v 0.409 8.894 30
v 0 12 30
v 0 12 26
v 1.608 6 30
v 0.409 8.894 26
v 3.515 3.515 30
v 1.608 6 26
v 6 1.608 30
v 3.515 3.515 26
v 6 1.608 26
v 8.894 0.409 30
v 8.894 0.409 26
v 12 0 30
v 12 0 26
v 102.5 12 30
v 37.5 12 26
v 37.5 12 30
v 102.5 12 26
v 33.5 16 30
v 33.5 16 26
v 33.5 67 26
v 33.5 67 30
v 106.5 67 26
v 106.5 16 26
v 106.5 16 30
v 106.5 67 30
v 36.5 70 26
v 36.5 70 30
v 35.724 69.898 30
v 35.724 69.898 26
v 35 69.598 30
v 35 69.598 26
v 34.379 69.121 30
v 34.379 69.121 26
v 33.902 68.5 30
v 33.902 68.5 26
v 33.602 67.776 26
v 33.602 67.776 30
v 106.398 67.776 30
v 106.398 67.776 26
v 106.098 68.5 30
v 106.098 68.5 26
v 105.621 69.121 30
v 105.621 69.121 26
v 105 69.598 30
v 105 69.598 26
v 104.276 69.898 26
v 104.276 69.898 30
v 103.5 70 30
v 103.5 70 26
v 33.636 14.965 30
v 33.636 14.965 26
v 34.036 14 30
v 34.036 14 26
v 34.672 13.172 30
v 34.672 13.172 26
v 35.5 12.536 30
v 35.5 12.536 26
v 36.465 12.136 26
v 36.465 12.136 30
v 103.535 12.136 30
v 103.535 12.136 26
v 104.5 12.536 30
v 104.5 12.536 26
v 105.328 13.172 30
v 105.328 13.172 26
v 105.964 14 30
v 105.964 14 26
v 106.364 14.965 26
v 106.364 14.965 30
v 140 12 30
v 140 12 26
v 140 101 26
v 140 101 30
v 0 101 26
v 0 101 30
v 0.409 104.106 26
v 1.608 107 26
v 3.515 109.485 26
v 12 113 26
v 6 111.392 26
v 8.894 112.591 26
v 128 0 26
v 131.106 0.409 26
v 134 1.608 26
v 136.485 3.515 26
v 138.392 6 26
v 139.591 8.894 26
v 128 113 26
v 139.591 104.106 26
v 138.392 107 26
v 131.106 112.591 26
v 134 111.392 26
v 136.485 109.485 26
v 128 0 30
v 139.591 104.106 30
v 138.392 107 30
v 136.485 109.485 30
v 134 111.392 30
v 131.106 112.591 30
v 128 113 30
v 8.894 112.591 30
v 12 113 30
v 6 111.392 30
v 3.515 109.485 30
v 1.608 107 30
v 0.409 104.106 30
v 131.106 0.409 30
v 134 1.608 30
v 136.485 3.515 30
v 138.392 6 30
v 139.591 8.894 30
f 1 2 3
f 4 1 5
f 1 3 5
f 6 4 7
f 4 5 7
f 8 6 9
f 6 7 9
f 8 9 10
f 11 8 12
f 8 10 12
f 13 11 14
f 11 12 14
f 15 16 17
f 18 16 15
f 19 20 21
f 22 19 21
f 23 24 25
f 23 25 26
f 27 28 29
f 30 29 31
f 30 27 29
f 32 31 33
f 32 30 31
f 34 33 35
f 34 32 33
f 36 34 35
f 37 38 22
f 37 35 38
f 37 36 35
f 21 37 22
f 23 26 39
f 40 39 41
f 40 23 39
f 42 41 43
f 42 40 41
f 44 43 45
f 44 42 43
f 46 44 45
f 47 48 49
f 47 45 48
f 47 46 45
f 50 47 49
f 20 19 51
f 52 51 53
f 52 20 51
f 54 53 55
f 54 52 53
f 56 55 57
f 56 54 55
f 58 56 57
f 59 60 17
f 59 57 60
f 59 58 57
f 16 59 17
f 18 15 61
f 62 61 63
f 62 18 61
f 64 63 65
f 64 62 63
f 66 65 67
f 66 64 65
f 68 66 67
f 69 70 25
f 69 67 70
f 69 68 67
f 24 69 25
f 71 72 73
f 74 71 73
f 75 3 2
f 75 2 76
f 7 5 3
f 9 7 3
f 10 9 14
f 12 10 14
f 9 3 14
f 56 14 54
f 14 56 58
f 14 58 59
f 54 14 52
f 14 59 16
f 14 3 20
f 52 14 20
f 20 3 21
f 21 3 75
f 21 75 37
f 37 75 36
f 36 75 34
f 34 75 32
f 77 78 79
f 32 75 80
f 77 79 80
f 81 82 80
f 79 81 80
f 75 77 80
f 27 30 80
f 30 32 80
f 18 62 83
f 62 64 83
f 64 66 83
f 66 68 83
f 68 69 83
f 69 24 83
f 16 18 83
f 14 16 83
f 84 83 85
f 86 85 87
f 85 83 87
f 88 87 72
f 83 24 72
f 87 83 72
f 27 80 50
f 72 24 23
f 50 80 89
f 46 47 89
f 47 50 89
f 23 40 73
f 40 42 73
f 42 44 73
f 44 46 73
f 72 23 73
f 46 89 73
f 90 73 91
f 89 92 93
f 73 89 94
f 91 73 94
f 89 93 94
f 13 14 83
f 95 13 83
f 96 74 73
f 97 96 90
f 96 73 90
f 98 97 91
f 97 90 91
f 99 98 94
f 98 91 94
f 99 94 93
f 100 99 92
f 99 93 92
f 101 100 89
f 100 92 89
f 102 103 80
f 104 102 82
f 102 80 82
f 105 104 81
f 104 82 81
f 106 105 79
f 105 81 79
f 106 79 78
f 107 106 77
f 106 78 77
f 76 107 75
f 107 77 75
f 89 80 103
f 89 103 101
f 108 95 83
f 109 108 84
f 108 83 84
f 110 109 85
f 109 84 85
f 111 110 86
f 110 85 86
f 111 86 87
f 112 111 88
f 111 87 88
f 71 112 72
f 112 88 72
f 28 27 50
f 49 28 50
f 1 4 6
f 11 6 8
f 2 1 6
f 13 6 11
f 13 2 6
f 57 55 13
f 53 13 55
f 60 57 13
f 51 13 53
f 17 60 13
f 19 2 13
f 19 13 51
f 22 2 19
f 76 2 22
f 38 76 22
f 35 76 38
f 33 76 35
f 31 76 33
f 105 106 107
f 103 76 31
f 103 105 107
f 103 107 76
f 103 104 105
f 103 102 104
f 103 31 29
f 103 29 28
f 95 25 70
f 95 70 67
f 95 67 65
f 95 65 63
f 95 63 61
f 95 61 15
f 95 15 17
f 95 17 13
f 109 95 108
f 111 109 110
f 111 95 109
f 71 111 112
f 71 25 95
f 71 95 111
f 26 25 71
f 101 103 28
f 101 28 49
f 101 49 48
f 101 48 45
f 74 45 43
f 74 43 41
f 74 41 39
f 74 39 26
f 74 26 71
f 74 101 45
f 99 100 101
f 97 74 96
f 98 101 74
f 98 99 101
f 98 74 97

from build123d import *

# Parameters (mm, degrees)
CYLINDER081_R          = 4
CYLINDER081_DEPTH      = 10
BOX058_W               = 4
BOX058_H               = 4
BOX058_DEPTH           = 10
CUT030_PLACEMENT_ANGLE = 180
CYLINDER077_R          = 3
CYLINDER077_DEPTH      = 10
BOX054_W               = 3
BOX054_H               = 3
BOX054_DEPTH           = 10
CYLINDER078_R          = 3
CYLINDER078_DEPTH      = 10
BOX055_W               = 3
BOX055_H               = 3
BOX055_DEPTH           = 10
CUT027_PLACEMENT_ANGLE = 270
CYLINDER080_R          = 4
CYLINDER080_DEPTH      = 10
BOX057_W               = 4
BOX057_H               = 4
BOX057_DEPTH           = 10
CUT029_PLACEMENT_ANGLE = 90
BOX053_W               = 73
BOX053_H               = 58
BOX053_DEPTH           = 10
CYLINDER074_R          = 12
CYLINDER074_DEPTH      = 10
BOX050_W               = 12
BOX050_H               = 12
BOX050_DEPTH           = 4
CUT022_PLACEMENT_ANGLE = 90
CYLINDER075_R          = 12
CYLINDER075_DEPTH      = 10
BOX051_W               = 12
BOX051_H               = 12
BOX051_DEPTH           = 4
CUT023_PLACEMENT_ANGLE = 180
CYLINDER076_R          = 12
CYLINDER076_DEPTH      = 10
BOX052_W               = 12
BOX052_H               = 12
BOX052_DEPTH           = 4
CUT024_PLACEMENT_ANGLE = 90
CYLINDER073_R          = 12
CYLINDER073_DEPTH      = 10
BOX049_W               = 12
BOX049_H               = 12
BOX049_DEPTH           = 4
BOX048_W               = 140
BOX048_H               = 113
BOX048_DEPTH           = 4


with BuildPart() as cylinder083:
    # Cylinder081 → Cylinder081 (new body)
    with BuildSketch(Plane(origin=(36.5, 67, 26), x_dir=(1, 0, 0), z_dir=(0, 0, 1))):
        Circle(CYLINDER081_R)
    extrude(amount=CYLINDER081_DEPTH)


with BuildPart() as outcutsdisplay004:
    # Box058 → Box058 (new body)
    with BuildSketch(Plane(origin=(32.5, 67, 26), x_dir=(1, 0, 0), z_dir=(0, 0, 1))):
        with Locations((2, 2)):
            Rectangle(BOX058_W, BOX058_H)
    extrude(amount=BOX058_DEPTH)

    # Cut030: cut Cylinder083
    add(cylinder083.part, mode=Mode.SUBTRACT)


with BuildPart() as outcutsdisplay004_1:
    # Cut030 placement: moved
    add(outcutsdisplay004.part.moved(Location((139, 83, 0))).rotate(Axis((139, 83, 0), (0, 0, 1)), CUT030_PLACEMENT_ANGLE))


with BuildPart() as cylinder079:
    # Cylinder077 → Cylinder077 (new body)
    with BuildSketch(Plane(origin=(36.5, 67, 26), x_dir=(1, 0, 0), z_dir=(0, 0, 1))):
        Circle(CYLINDER077_R)
    extrude(amount=CYLINDER077_DEPTH)


with BuildPart() as outcutsdisplay:
    # Box054 → Box054 (new body)
    with BuildSketch(Plane(origin=(33.5, 67, 26), x_dir=(1, 0, 0), z_dir=(0, 0, 1))):
        with Locations((1.5, 1.5)):
            Rectangle(BOX054_W, BOX054_H)
    extrude(amount=BOX054_DEPTH)

    # Cut026: cut Cylinder079
    add(cylinder079.part, mode=Mode.SUBTRACT)


with BuildPart() as cylinder080:
    # Cylinder078 → Cylinder078 (new body)
    with BuildSketch(Plane(origin=(36.5, 67, 26), x_dir=(1, 0, 0), z_dir=(0, 0, 1))):
        Circle(CYLINDER078_R)
    extrude(amount=CYLINDER078_DEPTH)


with BuildPart() as outcutsdisplay001:
    # Box055 → Box055 (new body)
    with BuildSketch(Plane(origin=(33.5, 67, 26), x_dir=(1, 0, 0), z_dir=(0, 0, 1))):
        with Locations((1.5, 1.5)):
            Rectangle(BOX055_W, BOX055_H)
    extrude(amount=BOX055_DEPTH)

    # Cut027: cut Cylinder080
    add(cylinder080.part, mode=Mode.SUBTRACT)


with BuildPart() as outcutsdisplay001_1:
    # Cut027 placement: moved
    add(outcutsdisplay001.part.moved(Location((36.5, 103.5, 0))).rotate(Axis((36.5, 103.5, 0), (0, 0, 1)), CUT027_PLACEMENT_ANGLE))


with BuildPart() as cylinder082:
    # Cylinder080 → Cylinder080 (new body)
    with BuildSketch(Plane(origin=(36.5, 67, 26), x_dir=(1, 0, 0), z_dir=(0, 0, 1))):
        Circle(CYLINDER080_R)
    extrude(amount=CYLINDER080_DEPTH)


with BuildPart() as displaycuts:
    # Box057 → Box057 (new body)
    with BuildSketch(Plane(origin=(32.5, 67, 26), x_dir=(1, 0, 0), z_dir=(0, 0, 1))):
        with Locations((2, 2)):
            Rectangle(BOX057_W, BOX057_H)
    extrude(amount=BOX057_DEPTH)

    # Cut029: cut Cylinder082
    add(cylinder082.part, mode=Mode.SUBTRACT)


with BuildPart() as displaycuts_1:
    # Cut029 placement: moved
    add(displaycuts.part.moved(Location((104.5, -20.5, 0))).rotate(Axis((104.5, -20.5, 0), (0, 0, 1)), CUT029_PLACEMENT_ANGLE))

    # Fusion041: union outCutsDisplay004, outCutsDisplay, outCutsDisplay001
    add(outcutsdisplay004_1.part)
    add(outcutsdisplay.part)
    add(outcutsdisplay001_1.part)


with BuildPart() as topcut:
    # Box053 → Box053 (new body)
    with BuildSketch(Plane(origin=(33.5, 12, 26), x_dir=(1, 0, 0), z_dir=(0, 0, 1))):
        with Locations((36.5, 29)):
            Rectangle(BOX053_W, BOX053_H)
    extrude(amount=BOX053_DEPTH)

    # Cut031: cut displayCuts
    add(displaycuts_1.part, mode=Mode.SUBTRACT)


with BuildPart() as cylinder076:
    # Cylinder074 → Cylinder074 (new body)
    with BuildSketch(Plane(origin=(12, 12, 0), x_dir=(1, 0, 0), z_dir=(0, 0, 1))):
        Circle(CYLINDER074_R)
    extrude(amount=CYLINDER074_DEPTH)


with BuildPart() as cutout006:
    # Box050 → Box050 (new body)
    with BuildSketch(Plane.XY):
        with Locations((6, 6)):
            Rectangle(BOX050_W, BOX050_H)
    extrude(amount=BOX050_DEPTH)

    # Cut022: cut Cylinder076
    add(cylinder076.part, mode=Mode.SUBTRACT)


with BuildPart() as cutout006_1:
    # Cut022 placement: moved
    add(cutout006.part.moved(Location((140, 0, 0))).rotate(Axis((140, 0, 0), (0, 0, 1)), CUT022_PLACEMENT_ANGLE))


with BuildPart() as cylinder077:
    # Cylinder075 → Cylinder075 (new body)
    with BuildSketch(Plane(origin=(12, 12, 0), x_dir=(1, 0, 0), z_dir=(0, 0, 1))):
        Circle(CYLINDER075_R)
    extrude(amount=CYLINDER075_DEPTH)


with BuildPart() as cutout007:
    # Box051 → Box051 (new body)
    with BuildSketch(Plane.XY):
        with Locations((6, 6)):
            Rectangle(BOX051_W, BOX051_H)
    extrude(amount=BOX051_DEPTH)

    # Cut023: cut Cylinder077
    add(cylinder077.part, mode=Mode.SUBTRACT)


with BuildPart() as cutout007_1:
    # Cut023 placement: moved
    add(cutout007.part.moved(Location((140, 113, 0))).rotate(Axis((140, 113, 0), (0, 0, 1)), CUT023_PLACEMENT_ANGLE))


with BuildPart() as cylinder078:
    # Cylinder076 → Cylinder076 (new body)
    with BuildSketch(Plane(origin=(12, 12, 0), x_dir=(1, 0, 0), z_dir=(0, 0, 1))):
        Circle(CYLINDER076_R)
    extrude(amount=CYLINDER076_DEPTH)


with BuildPart() as cutout008:
    # Box052 → Box052 (new body)
    with BuildSketch(Plane.XY):
        with Locations((6, 6)):
            Rectangle(BOX052_W, BOX052_H)
    extrude(amount=BOX052_DEPTH)

    # Cut024: cut Cylinder078
    add(cylinder078.part, mode=Mode.SUBTRACT)


with BuildPart() as cutout008_1:
    # Cut024 placement: moved
    add(cutout008.part.moved(Location((0, 113, 0))).rotate(Axis((0, 113, 0), (0, 0, -1)), CUT024_PLACEMENT_ANGLE))


with BuildPart() as cylinder075:
    # Cylinder073 → Cylinder073 (new body)
    with BuildSketch(Plane(origin=(12, 12, 0), x_dir=(1, 0, 0), z_dir=(0, 0, 1))):
        Circle(CYLINDER073_R)
    extrude(amount=CYLINDER073_DEPTH)


with BuildPart() as cutout009:
    # Box049 → Box049 (new body)
    with BuildSketch(Plane.XY):
        with Locations((6, 6)):
            Rectangle(BOX049_W, BOX049_H)
    extrude(amount=BOX049_DEPTH)

    # Cut021: cut Cylinder075
    add(cylinder075.part, mode=Mode.SUBTRACT)

    # Fusion040: union cutOut006, cutOut007, cutOut008
    add(cutout006_1.part)
    add(cutout007_1.part)
    add(cutout008_1.part)


with BuildPart() as top002:
    # Box048 → Box048 (new body)
    with BuildSketch(Plane.XY):
        with Locations((70, 56.5)):
            Rectangle(BOX048_W, BOX048_H)
    extrude(amount=BOX048_DEPTH)

    # Cut025: cut cutOut009
    add(cutout009.part, mode=Mode.SUBTRACT)


with BuildPart() as top002_1:
    # Cut025 placement: moved
    add(top002.part.moved(Location((0, 0, 26))))

    # Cut032: cut topCut
    add(topcut.part, mode=Mode.SUBTRACT)


solid = top002_1.part
